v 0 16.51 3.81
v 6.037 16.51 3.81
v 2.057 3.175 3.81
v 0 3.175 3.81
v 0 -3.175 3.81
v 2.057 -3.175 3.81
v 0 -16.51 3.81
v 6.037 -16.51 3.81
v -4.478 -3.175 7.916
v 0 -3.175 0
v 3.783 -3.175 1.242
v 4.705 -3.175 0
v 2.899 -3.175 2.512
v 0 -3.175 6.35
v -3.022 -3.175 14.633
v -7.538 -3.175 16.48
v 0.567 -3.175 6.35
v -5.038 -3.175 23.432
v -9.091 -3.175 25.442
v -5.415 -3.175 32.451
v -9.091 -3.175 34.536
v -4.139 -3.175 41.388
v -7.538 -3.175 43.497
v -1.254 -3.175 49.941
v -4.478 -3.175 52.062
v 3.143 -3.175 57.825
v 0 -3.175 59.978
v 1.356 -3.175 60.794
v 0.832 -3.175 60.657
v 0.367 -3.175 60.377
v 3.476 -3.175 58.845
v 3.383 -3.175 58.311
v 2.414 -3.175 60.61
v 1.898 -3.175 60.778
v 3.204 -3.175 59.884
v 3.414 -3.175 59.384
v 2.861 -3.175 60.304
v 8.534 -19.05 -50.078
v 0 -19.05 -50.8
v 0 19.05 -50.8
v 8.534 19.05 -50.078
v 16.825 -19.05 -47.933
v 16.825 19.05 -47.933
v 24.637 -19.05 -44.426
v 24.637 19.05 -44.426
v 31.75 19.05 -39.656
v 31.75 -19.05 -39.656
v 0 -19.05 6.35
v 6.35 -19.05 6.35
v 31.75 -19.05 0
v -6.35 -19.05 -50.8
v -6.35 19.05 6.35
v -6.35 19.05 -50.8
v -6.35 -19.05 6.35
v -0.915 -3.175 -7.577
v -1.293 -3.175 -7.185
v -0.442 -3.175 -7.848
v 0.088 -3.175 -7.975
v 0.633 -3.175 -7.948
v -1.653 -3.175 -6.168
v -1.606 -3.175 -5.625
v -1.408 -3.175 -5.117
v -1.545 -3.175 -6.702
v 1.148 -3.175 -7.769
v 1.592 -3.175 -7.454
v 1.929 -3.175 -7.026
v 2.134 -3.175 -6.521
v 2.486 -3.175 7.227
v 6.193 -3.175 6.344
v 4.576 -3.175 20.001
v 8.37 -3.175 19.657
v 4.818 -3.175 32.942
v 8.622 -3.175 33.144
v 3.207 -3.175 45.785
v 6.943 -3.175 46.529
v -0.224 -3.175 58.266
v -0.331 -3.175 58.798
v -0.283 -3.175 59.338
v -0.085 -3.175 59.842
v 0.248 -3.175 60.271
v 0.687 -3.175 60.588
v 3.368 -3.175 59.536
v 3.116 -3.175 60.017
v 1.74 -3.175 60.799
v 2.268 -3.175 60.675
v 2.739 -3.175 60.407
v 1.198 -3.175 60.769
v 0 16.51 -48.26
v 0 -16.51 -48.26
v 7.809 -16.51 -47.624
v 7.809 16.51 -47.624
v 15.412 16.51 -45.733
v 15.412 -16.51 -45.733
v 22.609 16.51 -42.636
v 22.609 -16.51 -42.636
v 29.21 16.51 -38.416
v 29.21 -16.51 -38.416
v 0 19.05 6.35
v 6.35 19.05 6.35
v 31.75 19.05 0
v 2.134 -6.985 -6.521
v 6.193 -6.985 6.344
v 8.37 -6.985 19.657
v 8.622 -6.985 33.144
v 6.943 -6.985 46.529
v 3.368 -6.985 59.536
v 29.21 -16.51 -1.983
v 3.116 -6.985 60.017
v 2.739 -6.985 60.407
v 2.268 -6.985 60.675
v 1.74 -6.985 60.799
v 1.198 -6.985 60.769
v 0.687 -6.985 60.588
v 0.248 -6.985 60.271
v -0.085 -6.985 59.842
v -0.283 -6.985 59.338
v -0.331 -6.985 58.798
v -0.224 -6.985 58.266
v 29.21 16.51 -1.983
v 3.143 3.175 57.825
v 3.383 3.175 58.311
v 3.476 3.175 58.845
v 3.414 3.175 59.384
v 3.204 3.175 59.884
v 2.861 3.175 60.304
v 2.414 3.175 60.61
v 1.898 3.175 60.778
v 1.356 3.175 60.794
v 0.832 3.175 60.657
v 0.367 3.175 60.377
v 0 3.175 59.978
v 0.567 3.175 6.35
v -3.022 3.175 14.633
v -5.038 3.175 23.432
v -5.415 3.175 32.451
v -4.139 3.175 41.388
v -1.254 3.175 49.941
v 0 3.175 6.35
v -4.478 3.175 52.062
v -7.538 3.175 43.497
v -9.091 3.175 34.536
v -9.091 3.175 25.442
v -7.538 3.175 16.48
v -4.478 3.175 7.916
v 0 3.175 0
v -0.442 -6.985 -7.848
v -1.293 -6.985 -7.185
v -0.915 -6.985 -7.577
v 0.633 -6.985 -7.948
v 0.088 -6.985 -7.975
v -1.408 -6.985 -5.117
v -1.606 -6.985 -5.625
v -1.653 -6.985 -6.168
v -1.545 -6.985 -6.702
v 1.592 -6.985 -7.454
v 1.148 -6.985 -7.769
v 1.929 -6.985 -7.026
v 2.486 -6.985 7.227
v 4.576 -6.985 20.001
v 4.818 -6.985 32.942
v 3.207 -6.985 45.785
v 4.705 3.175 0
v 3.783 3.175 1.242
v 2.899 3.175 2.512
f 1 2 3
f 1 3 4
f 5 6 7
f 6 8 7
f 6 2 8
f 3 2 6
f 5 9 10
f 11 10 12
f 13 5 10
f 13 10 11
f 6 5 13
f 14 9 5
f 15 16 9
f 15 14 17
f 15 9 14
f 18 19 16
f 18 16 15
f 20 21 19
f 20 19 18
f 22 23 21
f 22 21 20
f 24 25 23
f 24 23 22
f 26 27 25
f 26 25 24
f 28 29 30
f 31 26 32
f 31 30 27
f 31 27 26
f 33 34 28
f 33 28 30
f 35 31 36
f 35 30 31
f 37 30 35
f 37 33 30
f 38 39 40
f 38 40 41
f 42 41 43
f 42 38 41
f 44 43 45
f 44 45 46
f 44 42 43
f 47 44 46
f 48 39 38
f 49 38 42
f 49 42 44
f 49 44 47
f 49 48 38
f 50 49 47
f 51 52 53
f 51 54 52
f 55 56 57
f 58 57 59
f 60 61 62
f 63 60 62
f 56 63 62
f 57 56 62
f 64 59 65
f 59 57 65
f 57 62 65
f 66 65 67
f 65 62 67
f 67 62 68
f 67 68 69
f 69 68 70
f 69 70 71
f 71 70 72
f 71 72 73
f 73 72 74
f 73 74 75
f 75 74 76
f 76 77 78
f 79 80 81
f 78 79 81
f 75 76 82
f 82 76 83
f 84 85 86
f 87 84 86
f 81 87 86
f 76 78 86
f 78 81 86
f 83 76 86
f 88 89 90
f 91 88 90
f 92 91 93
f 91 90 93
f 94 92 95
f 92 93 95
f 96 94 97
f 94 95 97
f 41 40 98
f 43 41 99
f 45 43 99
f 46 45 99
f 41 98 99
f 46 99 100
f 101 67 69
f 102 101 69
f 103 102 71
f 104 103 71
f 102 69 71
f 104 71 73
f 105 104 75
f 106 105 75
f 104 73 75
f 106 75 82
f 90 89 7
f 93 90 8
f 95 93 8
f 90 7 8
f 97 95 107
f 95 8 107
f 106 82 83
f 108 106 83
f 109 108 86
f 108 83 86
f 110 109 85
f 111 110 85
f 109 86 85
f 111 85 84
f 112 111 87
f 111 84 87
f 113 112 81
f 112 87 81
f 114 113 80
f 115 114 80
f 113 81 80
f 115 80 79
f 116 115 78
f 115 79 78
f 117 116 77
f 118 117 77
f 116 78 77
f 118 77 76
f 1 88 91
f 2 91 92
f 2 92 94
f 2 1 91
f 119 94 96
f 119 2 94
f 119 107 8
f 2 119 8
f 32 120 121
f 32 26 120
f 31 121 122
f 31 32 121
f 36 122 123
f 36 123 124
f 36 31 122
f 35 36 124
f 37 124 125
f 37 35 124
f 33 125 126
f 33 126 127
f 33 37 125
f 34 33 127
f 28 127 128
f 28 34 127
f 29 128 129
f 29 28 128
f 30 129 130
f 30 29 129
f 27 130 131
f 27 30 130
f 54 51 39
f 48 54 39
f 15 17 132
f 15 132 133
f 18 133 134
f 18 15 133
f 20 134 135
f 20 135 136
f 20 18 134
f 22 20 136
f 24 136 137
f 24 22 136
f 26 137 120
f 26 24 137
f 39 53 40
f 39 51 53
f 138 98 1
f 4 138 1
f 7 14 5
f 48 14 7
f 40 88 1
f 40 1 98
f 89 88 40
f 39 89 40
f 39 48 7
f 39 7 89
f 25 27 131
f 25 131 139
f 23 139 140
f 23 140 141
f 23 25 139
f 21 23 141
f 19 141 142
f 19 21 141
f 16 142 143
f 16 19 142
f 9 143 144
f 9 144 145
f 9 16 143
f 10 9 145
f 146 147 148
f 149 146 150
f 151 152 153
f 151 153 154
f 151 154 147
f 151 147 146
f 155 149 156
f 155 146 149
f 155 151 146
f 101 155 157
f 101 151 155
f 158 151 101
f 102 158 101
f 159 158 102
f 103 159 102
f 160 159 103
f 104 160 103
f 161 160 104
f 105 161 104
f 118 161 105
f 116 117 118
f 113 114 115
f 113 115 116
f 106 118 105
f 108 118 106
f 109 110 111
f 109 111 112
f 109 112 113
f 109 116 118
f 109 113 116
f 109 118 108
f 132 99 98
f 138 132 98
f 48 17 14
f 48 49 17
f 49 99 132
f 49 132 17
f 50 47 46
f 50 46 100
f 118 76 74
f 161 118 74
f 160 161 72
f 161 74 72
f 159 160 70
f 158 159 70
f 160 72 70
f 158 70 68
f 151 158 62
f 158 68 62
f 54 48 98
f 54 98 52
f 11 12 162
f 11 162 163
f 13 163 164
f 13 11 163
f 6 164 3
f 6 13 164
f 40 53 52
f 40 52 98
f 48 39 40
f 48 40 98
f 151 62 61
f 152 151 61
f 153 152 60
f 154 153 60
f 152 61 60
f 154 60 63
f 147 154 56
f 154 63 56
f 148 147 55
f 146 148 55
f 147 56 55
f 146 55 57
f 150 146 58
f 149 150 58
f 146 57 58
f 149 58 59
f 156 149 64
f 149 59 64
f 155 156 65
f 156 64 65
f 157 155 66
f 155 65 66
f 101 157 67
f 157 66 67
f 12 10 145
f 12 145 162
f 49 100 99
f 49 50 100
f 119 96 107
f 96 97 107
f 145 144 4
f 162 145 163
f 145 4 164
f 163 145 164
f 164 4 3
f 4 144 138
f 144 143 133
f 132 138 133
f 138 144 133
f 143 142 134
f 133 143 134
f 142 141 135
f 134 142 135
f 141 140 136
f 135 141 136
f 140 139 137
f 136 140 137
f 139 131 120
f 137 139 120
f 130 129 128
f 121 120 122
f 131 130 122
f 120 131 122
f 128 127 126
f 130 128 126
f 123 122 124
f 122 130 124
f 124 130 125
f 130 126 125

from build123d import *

# Parameters (mm, degrees)
F1_DEPTH = 19.05
F2_T     = -2.54
F4_DEPTH = 3.175
F6_DEPTH = 19.05
F8_DEPTH = 3.81


with BuildPart() as f1:
    # F0 (on Front) → F1 (new body, symmetric)
    with BuildSketch(Plane.XZ):
        with BuildLine():
            Line((0, 6.35), (0, 0))
            Line((0, 0), (0, -50.8))
            ThreePointArc((0, -50.8), (16.824514, -47.933034), (31.75, -39.655737))
            Line((31.75, -39.655737), (31.75, 0))
            Line((31.75, 0), (6.35, 6.35))
            Line((6.35, 6.35), (0, 6.35))
        make_face()
    extrude(amount=F1_DEPTH, both=True)

    # F2
    f2_openings = [f1.faces().sort_by_distance(p)[0] for p in [
        (0, 0, -22.225),
    ]]
    offset(amount=F2_T, openings=f2_openings)

    # F3 (on Front) → F4 (join, symmetric)
    with BuildSketch(Plane.XZ):
        with BuildLine():
            ThreePointArc((3.143247, 57.824605), (2.648204, 60.472809), (0, 59.977766))
            ThreePointArc((0, 59.977766), (-9.286437, 29.988883), (0, 0))
            Line((0, 0), (4.705253, 0))
            ThreePointArc((4.705253, 0), (-5.458476, 28.658849), (3.143247, 57.824605))
        make_face()
    extrude(amount=F4_DEPTH, both=True)


with BuildPart() as f6:
    # F5 (on Front) → F6 (new body, symmetric)
    with BuildSketch(Plane.XZ):
        Polygon((-6.35, -50.8), (0, -50.8), (0, 6.35), (-6.35, 6.35), (-6.35, 0), align=None)
    extrude(amount=F6_DEPTH, both=True)


with BuildPart() as f8:
    # F7 (on face) → F8 (new body)
    with BuildSketch(Plane.XZ.offset(3.175)):
        with BuildLine():
            ThreePointArc((-1.408339, -5.116748), (-0.441534, -7.847542), (2.133585, -6.520626))
            ThreePointArc((2.133585, -6.520626), (8.738361, 26.396079), (3.367566, 59.536494))
            ThreePointArc((3.367566, 59.536494), (0.936316, 60.697128), (-0.224319, 58.265878))
            ThreePointArc((-0.224319, 58.265878), (4.929026, 26.467239), (-1.408339, -5.116748))
        make_face()
    extrude(amount=F8_DEPTH)


solid = Compound([f1.part, f6.part, f8.part])
